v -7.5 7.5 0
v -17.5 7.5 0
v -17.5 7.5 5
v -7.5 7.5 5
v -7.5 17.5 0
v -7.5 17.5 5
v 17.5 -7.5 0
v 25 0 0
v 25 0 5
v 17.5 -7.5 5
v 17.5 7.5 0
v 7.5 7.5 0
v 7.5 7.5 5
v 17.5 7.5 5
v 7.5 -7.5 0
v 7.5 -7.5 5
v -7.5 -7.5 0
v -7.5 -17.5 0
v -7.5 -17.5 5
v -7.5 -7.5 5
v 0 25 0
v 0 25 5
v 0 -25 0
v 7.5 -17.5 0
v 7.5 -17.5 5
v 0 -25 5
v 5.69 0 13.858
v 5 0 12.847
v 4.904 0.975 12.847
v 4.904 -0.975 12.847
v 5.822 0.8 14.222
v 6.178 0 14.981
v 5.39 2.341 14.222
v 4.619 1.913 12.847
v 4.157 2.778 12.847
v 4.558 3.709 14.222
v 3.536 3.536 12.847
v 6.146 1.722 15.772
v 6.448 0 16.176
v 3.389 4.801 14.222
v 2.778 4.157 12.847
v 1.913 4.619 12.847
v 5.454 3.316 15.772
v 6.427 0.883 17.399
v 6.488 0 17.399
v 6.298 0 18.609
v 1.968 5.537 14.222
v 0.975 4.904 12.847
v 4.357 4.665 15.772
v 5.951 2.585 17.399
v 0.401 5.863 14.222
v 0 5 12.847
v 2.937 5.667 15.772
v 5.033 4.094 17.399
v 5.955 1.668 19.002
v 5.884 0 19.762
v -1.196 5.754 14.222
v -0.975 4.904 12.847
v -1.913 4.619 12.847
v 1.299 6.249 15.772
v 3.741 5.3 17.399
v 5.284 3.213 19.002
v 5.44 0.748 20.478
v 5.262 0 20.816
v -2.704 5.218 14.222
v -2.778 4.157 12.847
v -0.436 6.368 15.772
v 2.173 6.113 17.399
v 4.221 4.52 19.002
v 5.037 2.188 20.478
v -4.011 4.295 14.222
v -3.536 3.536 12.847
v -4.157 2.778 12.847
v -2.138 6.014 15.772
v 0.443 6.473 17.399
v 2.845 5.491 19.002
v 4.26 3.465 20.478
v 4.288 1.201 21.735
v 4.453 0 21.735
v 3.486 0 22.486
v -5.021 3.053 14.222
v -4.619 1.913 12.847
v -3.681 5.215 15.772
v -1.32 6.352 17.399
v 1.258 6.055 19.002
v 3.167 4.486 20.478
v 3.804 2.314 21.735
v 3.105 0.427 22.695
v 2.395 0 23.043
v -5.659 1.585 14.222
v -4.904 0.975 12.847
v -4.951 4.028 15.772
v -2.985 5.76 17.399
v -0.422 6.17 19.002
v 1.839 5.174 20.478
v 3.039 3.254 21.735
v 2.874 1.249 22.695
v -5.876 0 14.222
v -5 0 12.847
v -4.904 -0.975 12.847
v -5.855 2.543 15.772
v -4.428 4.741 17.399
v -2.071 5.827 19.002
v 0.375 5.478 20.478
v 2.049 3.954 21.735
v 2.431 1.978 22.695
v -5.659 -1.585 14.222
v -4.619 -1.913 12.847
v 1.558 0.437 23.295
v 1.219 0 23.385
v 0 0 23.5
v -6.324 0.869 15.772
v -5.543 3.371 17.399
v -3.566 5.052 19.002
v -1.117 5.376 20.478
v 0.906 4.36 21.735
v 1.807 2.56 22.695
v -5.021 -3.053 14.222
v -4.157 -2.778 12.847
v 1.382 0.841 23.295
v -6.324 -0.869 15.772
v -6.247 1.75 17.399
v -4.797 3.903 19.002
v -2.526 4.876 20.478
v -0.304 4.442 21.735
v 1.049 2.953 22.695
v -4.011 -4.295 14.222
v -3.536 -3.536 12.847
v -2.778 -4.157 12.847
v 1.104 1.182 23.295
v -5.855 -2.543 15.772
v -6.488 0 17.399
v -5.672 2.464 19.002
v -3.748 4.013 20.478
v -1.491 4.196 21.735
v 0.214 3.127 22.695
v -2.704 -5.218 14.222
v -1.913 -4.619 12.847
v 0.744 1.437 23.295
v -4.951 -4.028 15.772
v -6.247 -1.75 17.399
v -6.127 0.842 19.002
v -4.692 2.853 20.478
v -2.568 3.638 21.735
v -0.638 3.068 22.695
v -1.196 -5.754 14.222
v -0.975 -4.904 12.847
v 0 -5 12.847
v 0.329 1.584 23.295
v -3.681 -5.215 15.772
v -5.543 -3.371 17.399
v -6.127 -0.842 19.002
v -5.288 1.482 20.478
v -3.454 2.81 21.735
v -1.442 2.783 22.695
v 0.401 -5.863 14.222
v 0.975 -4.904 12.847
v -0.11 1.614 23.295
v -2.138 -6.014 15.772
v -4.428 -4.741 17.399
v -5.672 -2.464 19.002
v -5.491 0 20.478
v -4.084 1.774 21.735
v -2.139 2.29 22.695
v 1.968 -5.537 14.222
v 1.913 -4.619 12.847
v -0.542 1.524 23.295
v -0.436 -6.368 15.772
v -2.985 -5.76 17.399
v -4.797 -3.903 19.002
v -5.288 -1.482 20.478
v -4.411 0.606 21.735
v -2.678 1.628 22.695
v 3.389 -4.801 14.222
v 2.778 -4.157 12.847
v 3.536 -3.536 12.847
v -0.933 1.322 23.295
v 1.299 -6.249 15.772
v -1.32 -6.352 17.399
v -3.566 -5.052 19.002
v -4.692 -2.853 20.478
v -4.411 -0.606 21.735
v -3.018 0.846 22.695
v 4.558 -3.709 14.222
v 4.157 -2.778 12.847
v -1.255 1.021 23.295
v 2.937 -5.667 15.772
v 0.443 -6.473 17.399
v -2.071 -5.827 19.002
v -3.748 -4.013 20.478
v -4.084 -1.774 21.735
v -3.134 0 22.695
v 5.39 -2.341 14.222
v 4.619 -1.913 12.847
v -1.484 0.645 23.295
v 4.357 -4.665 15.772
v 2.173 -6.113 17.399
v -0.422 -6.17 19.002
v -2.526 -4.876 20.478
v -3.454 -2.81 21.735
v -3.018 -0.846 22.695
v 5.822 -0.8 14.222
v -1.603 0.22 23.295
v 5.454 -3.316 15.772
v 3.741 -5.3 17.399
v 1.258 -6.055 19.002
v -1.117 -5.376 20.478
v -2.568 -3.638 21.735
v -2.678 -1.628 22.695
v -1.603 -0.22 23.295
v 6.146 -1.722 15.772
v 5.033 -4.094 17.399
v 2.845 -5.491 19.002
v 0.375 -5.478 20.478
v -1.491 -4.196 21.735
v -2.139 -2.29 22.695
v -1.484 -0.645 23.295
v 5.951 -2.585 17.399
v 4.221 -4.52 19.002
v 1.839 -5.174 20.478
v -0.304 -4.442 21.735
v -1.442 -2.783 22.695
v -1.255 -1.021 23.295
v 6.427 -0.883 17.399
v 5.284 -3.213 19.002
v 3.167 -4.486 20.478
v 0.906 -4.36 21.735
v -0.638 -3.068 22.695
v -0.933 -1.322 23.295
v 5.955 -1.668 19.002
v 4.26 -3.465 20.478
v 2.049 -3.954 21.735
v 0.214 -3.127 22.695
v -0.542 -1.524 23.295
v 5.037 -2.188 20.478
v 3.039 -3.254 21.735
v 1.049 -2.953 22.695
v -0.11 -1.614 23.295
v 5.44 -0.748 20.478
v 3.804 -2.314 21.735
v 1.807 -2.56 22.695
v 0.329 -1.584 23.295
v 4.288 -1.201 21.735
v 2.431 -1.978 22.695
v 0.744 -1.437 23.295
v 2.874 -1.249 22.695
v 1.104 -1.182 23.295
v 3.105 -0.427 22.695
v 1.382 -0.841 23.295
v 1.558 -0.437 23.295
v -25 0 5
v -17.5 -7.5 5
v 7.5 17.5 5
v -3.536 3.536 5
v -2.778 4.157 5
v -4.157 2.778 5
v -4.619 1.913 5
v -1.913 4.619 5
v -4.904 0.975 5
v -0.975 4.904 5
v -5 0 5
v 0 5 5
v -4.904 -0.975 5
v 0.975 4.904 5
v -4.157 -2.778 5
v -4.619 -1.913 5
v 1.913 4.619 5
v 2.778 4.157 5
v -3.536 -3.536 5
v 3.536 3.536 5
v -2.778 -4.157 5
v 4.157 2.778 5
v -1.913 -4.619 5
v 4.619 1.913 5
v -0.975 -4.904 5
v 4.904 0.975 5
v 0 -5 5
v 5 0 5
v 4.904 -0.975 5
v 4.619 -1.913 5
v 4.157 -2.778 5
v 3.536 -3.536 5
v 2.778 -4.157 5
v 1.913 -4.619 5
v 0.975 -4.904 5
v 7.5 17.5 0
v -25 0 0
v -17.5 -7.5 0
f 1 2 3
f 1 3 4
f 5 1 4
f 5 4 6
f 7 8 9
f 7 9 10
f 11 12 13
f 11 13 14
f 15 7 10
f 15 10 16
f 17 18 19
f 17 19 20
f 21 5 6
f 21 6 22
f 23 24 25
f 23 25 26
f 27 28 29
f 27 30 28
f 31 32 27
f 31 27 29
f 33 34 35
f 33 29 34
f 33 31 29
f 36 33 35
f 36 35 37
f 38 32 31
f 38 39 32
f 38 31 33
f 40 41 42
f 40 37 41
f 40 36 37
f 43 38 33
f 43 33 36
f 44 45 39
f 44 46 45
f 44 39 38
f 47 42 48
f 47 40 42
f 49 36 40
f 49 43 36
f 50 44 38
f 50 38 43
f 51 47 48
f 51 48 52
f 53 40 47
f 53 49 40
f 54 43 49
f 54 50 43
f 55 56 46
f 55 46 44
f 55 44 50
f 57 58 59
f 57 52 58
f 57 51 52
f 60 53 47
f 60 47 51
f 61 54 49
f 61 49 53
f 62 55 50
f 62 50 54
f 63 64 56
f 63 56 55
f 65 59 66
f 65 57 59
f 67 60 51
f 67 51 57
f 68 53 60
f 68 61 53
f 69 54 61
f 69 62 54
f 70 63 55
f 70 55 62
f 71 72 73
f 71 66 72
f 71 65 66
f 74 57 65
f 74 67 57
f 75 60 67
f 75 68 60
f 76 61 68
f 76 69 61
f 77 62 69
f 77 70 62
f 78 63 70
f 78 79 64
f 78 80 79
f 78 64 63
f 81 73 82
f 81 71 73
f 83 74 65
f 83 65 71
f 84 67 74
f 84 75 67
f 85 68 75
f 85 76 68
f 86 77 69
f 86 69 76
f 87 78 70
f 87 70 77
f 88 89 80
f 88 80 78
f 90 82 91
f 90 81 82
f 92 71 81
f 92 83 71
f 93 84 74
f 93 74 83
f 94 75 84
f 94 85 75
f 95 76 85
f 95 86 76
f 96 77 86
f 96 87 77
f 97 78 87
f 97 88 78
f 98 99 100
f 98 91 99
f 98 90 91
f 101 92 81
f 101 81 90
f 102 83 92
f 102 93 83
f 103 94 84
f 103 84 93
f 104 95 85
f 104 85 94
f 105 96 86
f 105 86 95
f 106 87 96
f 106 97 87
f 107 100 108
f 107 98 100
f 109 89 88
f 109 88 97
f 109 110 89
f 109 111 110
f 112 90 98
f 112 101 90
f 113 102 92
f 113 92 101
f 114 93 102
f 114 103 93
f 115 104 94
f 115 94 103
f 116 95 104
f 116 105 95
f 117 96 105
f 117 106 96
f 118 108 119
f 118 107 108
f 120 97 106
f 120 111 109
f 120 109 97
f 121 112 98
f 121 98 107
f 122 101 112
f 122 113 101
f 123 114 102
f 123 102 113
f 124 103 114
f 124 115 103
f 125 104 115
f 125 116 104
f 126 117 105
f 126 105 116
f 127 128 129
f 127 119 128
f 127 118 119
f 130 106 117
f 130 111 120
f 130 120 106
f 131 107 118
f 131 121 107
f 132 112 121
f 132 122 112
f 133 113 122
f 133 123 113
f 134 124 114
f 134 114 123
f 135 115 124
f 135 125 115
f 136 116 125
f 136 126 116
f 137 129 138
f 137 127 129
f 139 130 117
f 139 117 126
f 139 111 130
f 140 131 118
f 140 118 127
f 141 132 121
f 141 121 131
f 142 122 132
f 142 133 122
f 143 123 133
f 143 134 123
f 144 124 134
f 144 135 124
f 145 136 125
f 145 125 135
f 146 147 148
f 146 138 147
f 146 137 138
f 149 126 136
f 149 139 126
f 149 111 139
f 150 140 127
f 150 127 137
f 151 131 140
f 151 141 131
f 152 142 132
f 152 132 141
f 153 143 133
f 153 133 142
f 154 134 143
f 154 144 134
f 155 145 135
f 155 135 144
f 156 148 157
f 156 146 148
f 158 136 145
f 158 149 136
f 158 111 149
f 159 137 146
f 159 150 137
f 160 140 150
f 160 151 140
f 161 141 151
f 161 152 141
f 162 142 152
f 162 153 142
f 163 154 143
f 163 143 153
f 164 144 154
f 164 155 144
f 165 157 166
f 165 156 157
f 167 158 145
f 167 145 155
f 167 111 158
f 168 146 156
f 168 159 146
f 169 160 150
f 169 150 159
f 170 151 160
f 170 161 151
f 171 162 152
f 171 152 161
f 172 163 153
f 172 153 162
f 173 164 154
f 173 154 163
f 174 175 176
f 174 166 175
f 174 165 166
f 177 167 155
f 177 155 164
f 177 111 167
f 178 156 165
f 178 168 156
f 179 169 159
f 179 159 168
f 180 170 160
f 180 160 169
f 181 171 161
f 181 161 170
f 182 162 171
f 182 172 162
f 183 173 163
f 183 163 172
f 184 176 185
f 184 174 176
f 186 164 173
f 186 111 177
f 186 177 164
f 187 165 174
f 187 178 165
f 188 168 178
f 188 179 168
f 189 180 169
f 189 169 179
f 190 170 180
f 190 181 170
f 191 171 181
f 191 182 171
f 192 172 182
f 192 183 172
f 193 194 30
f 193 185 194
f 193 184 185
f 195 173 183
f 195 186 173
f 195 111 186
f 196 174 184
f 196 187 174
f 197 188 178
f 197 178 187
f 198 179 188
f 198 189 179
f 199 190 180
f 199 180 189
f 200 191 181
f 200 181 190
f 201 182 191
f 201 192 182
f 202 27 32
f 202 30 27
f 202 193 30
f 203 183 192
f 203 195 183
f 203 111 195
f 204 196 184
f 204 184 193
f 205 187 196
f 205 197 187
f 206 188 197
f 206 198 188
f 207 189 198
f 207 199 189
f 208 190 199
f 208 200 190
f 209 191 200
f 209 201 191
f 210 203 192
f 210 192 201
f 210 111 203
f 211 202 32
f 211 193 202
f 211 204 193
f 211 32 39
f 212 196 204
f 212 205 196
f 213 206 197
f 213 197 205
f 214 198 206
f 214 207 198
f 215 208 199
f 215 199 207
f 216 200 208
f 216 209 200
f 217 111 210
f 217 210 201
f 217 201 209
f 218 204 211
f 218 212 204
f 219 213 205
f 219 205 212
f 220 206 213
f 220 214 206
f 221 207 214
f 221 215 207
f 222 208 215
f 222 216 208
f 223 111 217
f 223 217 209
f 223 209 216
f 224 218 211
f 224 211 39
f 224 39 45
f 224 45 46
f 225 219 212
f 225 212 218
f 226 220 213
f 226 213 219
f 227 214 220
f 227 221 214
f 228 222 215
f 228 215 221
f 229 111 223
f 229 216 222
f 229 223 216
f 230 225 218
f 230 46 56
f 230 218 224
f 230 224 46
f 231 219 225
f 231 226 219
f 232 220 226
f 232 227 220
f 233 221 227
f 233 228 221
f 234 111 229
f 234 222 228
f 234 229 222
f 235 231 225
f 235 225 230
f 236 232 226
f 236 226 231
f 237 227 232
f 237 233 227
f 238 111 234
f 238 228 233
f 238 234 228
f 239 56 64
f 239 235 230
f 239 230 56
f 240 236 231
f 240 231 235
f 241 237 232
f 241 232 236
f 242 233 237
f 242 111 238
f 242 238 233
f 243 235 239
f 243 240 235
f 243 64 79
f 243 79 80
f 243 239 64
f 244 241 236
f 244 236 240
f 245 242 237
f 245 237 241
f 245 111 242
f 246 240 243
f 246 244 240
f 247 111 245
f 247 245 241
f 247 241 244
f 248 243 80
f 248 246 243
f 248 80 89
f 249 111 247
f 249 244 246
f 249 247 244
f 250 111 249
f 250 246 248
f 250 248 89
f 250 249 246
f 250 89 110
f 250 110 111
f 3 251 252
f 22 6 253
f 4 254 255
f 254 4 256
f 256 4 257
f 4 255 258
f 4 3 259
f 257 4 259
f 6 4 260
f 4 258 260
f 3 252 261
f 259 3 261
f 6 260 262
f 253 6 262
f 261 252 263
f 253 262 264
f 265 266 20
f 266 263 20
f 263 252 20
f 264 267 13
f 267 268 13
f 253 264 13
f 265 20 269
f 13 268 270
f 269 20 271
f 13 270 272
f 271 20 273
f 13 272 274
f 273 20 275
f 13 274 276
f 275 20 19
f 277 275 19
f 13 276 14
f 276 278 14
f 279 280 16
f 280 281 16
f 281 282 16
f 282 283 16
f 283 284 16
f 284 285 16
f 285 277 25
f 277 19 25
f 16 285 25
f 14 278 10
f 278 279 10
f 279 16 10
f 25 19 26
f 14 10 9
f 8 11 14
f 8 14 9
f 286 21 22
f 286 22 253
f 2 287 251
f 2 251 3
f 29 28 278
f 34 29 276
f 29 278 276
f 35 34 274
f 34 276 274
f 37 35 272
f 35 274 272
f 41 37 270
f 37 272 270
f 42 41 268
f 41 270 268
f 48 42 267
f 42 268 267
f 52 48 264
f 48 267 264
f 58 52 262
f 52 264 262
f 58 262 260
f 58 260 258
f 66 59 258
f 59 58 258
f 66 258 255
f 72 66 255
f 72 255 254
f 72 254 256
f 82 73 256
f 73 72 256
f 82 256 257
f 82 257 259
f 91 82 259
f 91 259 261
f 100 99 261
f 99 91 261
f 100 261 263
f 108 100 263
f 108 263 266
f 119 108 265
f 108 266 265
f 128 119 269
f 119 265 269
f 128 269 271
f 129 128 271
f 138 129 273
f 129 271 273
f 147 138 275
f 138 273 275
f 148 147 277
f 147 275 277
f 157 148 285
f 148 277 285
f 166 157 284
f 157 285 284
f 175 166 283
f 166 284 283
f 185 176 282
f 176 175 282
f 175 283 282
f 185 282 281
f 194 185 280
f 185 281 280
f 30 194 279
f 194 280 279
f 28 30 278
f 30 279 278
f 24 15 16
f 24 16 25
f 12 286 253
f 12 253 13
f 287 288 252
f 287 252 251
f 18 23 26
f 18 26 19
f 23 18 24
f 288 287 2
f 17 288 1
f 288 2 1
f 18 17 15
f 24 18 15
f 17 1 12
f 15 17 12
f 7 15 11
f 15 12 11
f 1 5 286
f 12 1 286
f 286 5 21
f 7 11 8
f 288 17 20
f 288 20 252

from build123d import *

# Parameters (mm, degrees)
CYLINDER011_R     = 5
CYLINDER011_DEPTH = 15
PAD_DEPTH         = 5
ARRAY006_COUNT    = 4


with BuildPart() as cylinder011:
    # Cylinder011 → Cylinder011 (new body)
    with BuildSketch(Plane.XY):
        Circle(CYLINDER011_R)
    extrude(amount=CYLINDER011_DEPTH)


with BuildPart() as sphere:
    # Sphere → Sphere (revolve)
    with BuildSketch(Plane(origin=(0, 0, 17), x_dir=(1, 0, 0), z_dir=(0, -1, 0))):
        with BuildLine():
            ThreePointArc((0, -6.5), (6.5, 0), (0, 6.5))
            Line((0, 6.5), (0, -6.5))
        make_face()
    revolve(axis=Axis((0, 0, 17), (0, 0, 1)))


with BuildPart() as piezacruz:
    # Sketch → Pad (new body)
    with BuildSketch(Plane.XY):
        Polygon((0, 7.5), (17.5, 7.5), (25, 0), (17.5, -7.5), (0, -7.5), align=None)
    extrude(amount=PAD_DEPTH)

    # Array006: piezaCruz ×4 about axis
    array006_axis = Axis((0, 0, 0), (0, 0, 1))


with BuildPart() as piezacruz_1:
    add(piezacruz.part)
    for i in range(1, ARRAY006_COUNT):
        add(piezacruz.part.rotate(array006_axis, i * 360 / ARRAY006_COUNT))

    # Fusion017: union Cylinder011, Sphere
    add(cylinder011.part)
    add(sphere.part)


solid = piezacruz_1.part
